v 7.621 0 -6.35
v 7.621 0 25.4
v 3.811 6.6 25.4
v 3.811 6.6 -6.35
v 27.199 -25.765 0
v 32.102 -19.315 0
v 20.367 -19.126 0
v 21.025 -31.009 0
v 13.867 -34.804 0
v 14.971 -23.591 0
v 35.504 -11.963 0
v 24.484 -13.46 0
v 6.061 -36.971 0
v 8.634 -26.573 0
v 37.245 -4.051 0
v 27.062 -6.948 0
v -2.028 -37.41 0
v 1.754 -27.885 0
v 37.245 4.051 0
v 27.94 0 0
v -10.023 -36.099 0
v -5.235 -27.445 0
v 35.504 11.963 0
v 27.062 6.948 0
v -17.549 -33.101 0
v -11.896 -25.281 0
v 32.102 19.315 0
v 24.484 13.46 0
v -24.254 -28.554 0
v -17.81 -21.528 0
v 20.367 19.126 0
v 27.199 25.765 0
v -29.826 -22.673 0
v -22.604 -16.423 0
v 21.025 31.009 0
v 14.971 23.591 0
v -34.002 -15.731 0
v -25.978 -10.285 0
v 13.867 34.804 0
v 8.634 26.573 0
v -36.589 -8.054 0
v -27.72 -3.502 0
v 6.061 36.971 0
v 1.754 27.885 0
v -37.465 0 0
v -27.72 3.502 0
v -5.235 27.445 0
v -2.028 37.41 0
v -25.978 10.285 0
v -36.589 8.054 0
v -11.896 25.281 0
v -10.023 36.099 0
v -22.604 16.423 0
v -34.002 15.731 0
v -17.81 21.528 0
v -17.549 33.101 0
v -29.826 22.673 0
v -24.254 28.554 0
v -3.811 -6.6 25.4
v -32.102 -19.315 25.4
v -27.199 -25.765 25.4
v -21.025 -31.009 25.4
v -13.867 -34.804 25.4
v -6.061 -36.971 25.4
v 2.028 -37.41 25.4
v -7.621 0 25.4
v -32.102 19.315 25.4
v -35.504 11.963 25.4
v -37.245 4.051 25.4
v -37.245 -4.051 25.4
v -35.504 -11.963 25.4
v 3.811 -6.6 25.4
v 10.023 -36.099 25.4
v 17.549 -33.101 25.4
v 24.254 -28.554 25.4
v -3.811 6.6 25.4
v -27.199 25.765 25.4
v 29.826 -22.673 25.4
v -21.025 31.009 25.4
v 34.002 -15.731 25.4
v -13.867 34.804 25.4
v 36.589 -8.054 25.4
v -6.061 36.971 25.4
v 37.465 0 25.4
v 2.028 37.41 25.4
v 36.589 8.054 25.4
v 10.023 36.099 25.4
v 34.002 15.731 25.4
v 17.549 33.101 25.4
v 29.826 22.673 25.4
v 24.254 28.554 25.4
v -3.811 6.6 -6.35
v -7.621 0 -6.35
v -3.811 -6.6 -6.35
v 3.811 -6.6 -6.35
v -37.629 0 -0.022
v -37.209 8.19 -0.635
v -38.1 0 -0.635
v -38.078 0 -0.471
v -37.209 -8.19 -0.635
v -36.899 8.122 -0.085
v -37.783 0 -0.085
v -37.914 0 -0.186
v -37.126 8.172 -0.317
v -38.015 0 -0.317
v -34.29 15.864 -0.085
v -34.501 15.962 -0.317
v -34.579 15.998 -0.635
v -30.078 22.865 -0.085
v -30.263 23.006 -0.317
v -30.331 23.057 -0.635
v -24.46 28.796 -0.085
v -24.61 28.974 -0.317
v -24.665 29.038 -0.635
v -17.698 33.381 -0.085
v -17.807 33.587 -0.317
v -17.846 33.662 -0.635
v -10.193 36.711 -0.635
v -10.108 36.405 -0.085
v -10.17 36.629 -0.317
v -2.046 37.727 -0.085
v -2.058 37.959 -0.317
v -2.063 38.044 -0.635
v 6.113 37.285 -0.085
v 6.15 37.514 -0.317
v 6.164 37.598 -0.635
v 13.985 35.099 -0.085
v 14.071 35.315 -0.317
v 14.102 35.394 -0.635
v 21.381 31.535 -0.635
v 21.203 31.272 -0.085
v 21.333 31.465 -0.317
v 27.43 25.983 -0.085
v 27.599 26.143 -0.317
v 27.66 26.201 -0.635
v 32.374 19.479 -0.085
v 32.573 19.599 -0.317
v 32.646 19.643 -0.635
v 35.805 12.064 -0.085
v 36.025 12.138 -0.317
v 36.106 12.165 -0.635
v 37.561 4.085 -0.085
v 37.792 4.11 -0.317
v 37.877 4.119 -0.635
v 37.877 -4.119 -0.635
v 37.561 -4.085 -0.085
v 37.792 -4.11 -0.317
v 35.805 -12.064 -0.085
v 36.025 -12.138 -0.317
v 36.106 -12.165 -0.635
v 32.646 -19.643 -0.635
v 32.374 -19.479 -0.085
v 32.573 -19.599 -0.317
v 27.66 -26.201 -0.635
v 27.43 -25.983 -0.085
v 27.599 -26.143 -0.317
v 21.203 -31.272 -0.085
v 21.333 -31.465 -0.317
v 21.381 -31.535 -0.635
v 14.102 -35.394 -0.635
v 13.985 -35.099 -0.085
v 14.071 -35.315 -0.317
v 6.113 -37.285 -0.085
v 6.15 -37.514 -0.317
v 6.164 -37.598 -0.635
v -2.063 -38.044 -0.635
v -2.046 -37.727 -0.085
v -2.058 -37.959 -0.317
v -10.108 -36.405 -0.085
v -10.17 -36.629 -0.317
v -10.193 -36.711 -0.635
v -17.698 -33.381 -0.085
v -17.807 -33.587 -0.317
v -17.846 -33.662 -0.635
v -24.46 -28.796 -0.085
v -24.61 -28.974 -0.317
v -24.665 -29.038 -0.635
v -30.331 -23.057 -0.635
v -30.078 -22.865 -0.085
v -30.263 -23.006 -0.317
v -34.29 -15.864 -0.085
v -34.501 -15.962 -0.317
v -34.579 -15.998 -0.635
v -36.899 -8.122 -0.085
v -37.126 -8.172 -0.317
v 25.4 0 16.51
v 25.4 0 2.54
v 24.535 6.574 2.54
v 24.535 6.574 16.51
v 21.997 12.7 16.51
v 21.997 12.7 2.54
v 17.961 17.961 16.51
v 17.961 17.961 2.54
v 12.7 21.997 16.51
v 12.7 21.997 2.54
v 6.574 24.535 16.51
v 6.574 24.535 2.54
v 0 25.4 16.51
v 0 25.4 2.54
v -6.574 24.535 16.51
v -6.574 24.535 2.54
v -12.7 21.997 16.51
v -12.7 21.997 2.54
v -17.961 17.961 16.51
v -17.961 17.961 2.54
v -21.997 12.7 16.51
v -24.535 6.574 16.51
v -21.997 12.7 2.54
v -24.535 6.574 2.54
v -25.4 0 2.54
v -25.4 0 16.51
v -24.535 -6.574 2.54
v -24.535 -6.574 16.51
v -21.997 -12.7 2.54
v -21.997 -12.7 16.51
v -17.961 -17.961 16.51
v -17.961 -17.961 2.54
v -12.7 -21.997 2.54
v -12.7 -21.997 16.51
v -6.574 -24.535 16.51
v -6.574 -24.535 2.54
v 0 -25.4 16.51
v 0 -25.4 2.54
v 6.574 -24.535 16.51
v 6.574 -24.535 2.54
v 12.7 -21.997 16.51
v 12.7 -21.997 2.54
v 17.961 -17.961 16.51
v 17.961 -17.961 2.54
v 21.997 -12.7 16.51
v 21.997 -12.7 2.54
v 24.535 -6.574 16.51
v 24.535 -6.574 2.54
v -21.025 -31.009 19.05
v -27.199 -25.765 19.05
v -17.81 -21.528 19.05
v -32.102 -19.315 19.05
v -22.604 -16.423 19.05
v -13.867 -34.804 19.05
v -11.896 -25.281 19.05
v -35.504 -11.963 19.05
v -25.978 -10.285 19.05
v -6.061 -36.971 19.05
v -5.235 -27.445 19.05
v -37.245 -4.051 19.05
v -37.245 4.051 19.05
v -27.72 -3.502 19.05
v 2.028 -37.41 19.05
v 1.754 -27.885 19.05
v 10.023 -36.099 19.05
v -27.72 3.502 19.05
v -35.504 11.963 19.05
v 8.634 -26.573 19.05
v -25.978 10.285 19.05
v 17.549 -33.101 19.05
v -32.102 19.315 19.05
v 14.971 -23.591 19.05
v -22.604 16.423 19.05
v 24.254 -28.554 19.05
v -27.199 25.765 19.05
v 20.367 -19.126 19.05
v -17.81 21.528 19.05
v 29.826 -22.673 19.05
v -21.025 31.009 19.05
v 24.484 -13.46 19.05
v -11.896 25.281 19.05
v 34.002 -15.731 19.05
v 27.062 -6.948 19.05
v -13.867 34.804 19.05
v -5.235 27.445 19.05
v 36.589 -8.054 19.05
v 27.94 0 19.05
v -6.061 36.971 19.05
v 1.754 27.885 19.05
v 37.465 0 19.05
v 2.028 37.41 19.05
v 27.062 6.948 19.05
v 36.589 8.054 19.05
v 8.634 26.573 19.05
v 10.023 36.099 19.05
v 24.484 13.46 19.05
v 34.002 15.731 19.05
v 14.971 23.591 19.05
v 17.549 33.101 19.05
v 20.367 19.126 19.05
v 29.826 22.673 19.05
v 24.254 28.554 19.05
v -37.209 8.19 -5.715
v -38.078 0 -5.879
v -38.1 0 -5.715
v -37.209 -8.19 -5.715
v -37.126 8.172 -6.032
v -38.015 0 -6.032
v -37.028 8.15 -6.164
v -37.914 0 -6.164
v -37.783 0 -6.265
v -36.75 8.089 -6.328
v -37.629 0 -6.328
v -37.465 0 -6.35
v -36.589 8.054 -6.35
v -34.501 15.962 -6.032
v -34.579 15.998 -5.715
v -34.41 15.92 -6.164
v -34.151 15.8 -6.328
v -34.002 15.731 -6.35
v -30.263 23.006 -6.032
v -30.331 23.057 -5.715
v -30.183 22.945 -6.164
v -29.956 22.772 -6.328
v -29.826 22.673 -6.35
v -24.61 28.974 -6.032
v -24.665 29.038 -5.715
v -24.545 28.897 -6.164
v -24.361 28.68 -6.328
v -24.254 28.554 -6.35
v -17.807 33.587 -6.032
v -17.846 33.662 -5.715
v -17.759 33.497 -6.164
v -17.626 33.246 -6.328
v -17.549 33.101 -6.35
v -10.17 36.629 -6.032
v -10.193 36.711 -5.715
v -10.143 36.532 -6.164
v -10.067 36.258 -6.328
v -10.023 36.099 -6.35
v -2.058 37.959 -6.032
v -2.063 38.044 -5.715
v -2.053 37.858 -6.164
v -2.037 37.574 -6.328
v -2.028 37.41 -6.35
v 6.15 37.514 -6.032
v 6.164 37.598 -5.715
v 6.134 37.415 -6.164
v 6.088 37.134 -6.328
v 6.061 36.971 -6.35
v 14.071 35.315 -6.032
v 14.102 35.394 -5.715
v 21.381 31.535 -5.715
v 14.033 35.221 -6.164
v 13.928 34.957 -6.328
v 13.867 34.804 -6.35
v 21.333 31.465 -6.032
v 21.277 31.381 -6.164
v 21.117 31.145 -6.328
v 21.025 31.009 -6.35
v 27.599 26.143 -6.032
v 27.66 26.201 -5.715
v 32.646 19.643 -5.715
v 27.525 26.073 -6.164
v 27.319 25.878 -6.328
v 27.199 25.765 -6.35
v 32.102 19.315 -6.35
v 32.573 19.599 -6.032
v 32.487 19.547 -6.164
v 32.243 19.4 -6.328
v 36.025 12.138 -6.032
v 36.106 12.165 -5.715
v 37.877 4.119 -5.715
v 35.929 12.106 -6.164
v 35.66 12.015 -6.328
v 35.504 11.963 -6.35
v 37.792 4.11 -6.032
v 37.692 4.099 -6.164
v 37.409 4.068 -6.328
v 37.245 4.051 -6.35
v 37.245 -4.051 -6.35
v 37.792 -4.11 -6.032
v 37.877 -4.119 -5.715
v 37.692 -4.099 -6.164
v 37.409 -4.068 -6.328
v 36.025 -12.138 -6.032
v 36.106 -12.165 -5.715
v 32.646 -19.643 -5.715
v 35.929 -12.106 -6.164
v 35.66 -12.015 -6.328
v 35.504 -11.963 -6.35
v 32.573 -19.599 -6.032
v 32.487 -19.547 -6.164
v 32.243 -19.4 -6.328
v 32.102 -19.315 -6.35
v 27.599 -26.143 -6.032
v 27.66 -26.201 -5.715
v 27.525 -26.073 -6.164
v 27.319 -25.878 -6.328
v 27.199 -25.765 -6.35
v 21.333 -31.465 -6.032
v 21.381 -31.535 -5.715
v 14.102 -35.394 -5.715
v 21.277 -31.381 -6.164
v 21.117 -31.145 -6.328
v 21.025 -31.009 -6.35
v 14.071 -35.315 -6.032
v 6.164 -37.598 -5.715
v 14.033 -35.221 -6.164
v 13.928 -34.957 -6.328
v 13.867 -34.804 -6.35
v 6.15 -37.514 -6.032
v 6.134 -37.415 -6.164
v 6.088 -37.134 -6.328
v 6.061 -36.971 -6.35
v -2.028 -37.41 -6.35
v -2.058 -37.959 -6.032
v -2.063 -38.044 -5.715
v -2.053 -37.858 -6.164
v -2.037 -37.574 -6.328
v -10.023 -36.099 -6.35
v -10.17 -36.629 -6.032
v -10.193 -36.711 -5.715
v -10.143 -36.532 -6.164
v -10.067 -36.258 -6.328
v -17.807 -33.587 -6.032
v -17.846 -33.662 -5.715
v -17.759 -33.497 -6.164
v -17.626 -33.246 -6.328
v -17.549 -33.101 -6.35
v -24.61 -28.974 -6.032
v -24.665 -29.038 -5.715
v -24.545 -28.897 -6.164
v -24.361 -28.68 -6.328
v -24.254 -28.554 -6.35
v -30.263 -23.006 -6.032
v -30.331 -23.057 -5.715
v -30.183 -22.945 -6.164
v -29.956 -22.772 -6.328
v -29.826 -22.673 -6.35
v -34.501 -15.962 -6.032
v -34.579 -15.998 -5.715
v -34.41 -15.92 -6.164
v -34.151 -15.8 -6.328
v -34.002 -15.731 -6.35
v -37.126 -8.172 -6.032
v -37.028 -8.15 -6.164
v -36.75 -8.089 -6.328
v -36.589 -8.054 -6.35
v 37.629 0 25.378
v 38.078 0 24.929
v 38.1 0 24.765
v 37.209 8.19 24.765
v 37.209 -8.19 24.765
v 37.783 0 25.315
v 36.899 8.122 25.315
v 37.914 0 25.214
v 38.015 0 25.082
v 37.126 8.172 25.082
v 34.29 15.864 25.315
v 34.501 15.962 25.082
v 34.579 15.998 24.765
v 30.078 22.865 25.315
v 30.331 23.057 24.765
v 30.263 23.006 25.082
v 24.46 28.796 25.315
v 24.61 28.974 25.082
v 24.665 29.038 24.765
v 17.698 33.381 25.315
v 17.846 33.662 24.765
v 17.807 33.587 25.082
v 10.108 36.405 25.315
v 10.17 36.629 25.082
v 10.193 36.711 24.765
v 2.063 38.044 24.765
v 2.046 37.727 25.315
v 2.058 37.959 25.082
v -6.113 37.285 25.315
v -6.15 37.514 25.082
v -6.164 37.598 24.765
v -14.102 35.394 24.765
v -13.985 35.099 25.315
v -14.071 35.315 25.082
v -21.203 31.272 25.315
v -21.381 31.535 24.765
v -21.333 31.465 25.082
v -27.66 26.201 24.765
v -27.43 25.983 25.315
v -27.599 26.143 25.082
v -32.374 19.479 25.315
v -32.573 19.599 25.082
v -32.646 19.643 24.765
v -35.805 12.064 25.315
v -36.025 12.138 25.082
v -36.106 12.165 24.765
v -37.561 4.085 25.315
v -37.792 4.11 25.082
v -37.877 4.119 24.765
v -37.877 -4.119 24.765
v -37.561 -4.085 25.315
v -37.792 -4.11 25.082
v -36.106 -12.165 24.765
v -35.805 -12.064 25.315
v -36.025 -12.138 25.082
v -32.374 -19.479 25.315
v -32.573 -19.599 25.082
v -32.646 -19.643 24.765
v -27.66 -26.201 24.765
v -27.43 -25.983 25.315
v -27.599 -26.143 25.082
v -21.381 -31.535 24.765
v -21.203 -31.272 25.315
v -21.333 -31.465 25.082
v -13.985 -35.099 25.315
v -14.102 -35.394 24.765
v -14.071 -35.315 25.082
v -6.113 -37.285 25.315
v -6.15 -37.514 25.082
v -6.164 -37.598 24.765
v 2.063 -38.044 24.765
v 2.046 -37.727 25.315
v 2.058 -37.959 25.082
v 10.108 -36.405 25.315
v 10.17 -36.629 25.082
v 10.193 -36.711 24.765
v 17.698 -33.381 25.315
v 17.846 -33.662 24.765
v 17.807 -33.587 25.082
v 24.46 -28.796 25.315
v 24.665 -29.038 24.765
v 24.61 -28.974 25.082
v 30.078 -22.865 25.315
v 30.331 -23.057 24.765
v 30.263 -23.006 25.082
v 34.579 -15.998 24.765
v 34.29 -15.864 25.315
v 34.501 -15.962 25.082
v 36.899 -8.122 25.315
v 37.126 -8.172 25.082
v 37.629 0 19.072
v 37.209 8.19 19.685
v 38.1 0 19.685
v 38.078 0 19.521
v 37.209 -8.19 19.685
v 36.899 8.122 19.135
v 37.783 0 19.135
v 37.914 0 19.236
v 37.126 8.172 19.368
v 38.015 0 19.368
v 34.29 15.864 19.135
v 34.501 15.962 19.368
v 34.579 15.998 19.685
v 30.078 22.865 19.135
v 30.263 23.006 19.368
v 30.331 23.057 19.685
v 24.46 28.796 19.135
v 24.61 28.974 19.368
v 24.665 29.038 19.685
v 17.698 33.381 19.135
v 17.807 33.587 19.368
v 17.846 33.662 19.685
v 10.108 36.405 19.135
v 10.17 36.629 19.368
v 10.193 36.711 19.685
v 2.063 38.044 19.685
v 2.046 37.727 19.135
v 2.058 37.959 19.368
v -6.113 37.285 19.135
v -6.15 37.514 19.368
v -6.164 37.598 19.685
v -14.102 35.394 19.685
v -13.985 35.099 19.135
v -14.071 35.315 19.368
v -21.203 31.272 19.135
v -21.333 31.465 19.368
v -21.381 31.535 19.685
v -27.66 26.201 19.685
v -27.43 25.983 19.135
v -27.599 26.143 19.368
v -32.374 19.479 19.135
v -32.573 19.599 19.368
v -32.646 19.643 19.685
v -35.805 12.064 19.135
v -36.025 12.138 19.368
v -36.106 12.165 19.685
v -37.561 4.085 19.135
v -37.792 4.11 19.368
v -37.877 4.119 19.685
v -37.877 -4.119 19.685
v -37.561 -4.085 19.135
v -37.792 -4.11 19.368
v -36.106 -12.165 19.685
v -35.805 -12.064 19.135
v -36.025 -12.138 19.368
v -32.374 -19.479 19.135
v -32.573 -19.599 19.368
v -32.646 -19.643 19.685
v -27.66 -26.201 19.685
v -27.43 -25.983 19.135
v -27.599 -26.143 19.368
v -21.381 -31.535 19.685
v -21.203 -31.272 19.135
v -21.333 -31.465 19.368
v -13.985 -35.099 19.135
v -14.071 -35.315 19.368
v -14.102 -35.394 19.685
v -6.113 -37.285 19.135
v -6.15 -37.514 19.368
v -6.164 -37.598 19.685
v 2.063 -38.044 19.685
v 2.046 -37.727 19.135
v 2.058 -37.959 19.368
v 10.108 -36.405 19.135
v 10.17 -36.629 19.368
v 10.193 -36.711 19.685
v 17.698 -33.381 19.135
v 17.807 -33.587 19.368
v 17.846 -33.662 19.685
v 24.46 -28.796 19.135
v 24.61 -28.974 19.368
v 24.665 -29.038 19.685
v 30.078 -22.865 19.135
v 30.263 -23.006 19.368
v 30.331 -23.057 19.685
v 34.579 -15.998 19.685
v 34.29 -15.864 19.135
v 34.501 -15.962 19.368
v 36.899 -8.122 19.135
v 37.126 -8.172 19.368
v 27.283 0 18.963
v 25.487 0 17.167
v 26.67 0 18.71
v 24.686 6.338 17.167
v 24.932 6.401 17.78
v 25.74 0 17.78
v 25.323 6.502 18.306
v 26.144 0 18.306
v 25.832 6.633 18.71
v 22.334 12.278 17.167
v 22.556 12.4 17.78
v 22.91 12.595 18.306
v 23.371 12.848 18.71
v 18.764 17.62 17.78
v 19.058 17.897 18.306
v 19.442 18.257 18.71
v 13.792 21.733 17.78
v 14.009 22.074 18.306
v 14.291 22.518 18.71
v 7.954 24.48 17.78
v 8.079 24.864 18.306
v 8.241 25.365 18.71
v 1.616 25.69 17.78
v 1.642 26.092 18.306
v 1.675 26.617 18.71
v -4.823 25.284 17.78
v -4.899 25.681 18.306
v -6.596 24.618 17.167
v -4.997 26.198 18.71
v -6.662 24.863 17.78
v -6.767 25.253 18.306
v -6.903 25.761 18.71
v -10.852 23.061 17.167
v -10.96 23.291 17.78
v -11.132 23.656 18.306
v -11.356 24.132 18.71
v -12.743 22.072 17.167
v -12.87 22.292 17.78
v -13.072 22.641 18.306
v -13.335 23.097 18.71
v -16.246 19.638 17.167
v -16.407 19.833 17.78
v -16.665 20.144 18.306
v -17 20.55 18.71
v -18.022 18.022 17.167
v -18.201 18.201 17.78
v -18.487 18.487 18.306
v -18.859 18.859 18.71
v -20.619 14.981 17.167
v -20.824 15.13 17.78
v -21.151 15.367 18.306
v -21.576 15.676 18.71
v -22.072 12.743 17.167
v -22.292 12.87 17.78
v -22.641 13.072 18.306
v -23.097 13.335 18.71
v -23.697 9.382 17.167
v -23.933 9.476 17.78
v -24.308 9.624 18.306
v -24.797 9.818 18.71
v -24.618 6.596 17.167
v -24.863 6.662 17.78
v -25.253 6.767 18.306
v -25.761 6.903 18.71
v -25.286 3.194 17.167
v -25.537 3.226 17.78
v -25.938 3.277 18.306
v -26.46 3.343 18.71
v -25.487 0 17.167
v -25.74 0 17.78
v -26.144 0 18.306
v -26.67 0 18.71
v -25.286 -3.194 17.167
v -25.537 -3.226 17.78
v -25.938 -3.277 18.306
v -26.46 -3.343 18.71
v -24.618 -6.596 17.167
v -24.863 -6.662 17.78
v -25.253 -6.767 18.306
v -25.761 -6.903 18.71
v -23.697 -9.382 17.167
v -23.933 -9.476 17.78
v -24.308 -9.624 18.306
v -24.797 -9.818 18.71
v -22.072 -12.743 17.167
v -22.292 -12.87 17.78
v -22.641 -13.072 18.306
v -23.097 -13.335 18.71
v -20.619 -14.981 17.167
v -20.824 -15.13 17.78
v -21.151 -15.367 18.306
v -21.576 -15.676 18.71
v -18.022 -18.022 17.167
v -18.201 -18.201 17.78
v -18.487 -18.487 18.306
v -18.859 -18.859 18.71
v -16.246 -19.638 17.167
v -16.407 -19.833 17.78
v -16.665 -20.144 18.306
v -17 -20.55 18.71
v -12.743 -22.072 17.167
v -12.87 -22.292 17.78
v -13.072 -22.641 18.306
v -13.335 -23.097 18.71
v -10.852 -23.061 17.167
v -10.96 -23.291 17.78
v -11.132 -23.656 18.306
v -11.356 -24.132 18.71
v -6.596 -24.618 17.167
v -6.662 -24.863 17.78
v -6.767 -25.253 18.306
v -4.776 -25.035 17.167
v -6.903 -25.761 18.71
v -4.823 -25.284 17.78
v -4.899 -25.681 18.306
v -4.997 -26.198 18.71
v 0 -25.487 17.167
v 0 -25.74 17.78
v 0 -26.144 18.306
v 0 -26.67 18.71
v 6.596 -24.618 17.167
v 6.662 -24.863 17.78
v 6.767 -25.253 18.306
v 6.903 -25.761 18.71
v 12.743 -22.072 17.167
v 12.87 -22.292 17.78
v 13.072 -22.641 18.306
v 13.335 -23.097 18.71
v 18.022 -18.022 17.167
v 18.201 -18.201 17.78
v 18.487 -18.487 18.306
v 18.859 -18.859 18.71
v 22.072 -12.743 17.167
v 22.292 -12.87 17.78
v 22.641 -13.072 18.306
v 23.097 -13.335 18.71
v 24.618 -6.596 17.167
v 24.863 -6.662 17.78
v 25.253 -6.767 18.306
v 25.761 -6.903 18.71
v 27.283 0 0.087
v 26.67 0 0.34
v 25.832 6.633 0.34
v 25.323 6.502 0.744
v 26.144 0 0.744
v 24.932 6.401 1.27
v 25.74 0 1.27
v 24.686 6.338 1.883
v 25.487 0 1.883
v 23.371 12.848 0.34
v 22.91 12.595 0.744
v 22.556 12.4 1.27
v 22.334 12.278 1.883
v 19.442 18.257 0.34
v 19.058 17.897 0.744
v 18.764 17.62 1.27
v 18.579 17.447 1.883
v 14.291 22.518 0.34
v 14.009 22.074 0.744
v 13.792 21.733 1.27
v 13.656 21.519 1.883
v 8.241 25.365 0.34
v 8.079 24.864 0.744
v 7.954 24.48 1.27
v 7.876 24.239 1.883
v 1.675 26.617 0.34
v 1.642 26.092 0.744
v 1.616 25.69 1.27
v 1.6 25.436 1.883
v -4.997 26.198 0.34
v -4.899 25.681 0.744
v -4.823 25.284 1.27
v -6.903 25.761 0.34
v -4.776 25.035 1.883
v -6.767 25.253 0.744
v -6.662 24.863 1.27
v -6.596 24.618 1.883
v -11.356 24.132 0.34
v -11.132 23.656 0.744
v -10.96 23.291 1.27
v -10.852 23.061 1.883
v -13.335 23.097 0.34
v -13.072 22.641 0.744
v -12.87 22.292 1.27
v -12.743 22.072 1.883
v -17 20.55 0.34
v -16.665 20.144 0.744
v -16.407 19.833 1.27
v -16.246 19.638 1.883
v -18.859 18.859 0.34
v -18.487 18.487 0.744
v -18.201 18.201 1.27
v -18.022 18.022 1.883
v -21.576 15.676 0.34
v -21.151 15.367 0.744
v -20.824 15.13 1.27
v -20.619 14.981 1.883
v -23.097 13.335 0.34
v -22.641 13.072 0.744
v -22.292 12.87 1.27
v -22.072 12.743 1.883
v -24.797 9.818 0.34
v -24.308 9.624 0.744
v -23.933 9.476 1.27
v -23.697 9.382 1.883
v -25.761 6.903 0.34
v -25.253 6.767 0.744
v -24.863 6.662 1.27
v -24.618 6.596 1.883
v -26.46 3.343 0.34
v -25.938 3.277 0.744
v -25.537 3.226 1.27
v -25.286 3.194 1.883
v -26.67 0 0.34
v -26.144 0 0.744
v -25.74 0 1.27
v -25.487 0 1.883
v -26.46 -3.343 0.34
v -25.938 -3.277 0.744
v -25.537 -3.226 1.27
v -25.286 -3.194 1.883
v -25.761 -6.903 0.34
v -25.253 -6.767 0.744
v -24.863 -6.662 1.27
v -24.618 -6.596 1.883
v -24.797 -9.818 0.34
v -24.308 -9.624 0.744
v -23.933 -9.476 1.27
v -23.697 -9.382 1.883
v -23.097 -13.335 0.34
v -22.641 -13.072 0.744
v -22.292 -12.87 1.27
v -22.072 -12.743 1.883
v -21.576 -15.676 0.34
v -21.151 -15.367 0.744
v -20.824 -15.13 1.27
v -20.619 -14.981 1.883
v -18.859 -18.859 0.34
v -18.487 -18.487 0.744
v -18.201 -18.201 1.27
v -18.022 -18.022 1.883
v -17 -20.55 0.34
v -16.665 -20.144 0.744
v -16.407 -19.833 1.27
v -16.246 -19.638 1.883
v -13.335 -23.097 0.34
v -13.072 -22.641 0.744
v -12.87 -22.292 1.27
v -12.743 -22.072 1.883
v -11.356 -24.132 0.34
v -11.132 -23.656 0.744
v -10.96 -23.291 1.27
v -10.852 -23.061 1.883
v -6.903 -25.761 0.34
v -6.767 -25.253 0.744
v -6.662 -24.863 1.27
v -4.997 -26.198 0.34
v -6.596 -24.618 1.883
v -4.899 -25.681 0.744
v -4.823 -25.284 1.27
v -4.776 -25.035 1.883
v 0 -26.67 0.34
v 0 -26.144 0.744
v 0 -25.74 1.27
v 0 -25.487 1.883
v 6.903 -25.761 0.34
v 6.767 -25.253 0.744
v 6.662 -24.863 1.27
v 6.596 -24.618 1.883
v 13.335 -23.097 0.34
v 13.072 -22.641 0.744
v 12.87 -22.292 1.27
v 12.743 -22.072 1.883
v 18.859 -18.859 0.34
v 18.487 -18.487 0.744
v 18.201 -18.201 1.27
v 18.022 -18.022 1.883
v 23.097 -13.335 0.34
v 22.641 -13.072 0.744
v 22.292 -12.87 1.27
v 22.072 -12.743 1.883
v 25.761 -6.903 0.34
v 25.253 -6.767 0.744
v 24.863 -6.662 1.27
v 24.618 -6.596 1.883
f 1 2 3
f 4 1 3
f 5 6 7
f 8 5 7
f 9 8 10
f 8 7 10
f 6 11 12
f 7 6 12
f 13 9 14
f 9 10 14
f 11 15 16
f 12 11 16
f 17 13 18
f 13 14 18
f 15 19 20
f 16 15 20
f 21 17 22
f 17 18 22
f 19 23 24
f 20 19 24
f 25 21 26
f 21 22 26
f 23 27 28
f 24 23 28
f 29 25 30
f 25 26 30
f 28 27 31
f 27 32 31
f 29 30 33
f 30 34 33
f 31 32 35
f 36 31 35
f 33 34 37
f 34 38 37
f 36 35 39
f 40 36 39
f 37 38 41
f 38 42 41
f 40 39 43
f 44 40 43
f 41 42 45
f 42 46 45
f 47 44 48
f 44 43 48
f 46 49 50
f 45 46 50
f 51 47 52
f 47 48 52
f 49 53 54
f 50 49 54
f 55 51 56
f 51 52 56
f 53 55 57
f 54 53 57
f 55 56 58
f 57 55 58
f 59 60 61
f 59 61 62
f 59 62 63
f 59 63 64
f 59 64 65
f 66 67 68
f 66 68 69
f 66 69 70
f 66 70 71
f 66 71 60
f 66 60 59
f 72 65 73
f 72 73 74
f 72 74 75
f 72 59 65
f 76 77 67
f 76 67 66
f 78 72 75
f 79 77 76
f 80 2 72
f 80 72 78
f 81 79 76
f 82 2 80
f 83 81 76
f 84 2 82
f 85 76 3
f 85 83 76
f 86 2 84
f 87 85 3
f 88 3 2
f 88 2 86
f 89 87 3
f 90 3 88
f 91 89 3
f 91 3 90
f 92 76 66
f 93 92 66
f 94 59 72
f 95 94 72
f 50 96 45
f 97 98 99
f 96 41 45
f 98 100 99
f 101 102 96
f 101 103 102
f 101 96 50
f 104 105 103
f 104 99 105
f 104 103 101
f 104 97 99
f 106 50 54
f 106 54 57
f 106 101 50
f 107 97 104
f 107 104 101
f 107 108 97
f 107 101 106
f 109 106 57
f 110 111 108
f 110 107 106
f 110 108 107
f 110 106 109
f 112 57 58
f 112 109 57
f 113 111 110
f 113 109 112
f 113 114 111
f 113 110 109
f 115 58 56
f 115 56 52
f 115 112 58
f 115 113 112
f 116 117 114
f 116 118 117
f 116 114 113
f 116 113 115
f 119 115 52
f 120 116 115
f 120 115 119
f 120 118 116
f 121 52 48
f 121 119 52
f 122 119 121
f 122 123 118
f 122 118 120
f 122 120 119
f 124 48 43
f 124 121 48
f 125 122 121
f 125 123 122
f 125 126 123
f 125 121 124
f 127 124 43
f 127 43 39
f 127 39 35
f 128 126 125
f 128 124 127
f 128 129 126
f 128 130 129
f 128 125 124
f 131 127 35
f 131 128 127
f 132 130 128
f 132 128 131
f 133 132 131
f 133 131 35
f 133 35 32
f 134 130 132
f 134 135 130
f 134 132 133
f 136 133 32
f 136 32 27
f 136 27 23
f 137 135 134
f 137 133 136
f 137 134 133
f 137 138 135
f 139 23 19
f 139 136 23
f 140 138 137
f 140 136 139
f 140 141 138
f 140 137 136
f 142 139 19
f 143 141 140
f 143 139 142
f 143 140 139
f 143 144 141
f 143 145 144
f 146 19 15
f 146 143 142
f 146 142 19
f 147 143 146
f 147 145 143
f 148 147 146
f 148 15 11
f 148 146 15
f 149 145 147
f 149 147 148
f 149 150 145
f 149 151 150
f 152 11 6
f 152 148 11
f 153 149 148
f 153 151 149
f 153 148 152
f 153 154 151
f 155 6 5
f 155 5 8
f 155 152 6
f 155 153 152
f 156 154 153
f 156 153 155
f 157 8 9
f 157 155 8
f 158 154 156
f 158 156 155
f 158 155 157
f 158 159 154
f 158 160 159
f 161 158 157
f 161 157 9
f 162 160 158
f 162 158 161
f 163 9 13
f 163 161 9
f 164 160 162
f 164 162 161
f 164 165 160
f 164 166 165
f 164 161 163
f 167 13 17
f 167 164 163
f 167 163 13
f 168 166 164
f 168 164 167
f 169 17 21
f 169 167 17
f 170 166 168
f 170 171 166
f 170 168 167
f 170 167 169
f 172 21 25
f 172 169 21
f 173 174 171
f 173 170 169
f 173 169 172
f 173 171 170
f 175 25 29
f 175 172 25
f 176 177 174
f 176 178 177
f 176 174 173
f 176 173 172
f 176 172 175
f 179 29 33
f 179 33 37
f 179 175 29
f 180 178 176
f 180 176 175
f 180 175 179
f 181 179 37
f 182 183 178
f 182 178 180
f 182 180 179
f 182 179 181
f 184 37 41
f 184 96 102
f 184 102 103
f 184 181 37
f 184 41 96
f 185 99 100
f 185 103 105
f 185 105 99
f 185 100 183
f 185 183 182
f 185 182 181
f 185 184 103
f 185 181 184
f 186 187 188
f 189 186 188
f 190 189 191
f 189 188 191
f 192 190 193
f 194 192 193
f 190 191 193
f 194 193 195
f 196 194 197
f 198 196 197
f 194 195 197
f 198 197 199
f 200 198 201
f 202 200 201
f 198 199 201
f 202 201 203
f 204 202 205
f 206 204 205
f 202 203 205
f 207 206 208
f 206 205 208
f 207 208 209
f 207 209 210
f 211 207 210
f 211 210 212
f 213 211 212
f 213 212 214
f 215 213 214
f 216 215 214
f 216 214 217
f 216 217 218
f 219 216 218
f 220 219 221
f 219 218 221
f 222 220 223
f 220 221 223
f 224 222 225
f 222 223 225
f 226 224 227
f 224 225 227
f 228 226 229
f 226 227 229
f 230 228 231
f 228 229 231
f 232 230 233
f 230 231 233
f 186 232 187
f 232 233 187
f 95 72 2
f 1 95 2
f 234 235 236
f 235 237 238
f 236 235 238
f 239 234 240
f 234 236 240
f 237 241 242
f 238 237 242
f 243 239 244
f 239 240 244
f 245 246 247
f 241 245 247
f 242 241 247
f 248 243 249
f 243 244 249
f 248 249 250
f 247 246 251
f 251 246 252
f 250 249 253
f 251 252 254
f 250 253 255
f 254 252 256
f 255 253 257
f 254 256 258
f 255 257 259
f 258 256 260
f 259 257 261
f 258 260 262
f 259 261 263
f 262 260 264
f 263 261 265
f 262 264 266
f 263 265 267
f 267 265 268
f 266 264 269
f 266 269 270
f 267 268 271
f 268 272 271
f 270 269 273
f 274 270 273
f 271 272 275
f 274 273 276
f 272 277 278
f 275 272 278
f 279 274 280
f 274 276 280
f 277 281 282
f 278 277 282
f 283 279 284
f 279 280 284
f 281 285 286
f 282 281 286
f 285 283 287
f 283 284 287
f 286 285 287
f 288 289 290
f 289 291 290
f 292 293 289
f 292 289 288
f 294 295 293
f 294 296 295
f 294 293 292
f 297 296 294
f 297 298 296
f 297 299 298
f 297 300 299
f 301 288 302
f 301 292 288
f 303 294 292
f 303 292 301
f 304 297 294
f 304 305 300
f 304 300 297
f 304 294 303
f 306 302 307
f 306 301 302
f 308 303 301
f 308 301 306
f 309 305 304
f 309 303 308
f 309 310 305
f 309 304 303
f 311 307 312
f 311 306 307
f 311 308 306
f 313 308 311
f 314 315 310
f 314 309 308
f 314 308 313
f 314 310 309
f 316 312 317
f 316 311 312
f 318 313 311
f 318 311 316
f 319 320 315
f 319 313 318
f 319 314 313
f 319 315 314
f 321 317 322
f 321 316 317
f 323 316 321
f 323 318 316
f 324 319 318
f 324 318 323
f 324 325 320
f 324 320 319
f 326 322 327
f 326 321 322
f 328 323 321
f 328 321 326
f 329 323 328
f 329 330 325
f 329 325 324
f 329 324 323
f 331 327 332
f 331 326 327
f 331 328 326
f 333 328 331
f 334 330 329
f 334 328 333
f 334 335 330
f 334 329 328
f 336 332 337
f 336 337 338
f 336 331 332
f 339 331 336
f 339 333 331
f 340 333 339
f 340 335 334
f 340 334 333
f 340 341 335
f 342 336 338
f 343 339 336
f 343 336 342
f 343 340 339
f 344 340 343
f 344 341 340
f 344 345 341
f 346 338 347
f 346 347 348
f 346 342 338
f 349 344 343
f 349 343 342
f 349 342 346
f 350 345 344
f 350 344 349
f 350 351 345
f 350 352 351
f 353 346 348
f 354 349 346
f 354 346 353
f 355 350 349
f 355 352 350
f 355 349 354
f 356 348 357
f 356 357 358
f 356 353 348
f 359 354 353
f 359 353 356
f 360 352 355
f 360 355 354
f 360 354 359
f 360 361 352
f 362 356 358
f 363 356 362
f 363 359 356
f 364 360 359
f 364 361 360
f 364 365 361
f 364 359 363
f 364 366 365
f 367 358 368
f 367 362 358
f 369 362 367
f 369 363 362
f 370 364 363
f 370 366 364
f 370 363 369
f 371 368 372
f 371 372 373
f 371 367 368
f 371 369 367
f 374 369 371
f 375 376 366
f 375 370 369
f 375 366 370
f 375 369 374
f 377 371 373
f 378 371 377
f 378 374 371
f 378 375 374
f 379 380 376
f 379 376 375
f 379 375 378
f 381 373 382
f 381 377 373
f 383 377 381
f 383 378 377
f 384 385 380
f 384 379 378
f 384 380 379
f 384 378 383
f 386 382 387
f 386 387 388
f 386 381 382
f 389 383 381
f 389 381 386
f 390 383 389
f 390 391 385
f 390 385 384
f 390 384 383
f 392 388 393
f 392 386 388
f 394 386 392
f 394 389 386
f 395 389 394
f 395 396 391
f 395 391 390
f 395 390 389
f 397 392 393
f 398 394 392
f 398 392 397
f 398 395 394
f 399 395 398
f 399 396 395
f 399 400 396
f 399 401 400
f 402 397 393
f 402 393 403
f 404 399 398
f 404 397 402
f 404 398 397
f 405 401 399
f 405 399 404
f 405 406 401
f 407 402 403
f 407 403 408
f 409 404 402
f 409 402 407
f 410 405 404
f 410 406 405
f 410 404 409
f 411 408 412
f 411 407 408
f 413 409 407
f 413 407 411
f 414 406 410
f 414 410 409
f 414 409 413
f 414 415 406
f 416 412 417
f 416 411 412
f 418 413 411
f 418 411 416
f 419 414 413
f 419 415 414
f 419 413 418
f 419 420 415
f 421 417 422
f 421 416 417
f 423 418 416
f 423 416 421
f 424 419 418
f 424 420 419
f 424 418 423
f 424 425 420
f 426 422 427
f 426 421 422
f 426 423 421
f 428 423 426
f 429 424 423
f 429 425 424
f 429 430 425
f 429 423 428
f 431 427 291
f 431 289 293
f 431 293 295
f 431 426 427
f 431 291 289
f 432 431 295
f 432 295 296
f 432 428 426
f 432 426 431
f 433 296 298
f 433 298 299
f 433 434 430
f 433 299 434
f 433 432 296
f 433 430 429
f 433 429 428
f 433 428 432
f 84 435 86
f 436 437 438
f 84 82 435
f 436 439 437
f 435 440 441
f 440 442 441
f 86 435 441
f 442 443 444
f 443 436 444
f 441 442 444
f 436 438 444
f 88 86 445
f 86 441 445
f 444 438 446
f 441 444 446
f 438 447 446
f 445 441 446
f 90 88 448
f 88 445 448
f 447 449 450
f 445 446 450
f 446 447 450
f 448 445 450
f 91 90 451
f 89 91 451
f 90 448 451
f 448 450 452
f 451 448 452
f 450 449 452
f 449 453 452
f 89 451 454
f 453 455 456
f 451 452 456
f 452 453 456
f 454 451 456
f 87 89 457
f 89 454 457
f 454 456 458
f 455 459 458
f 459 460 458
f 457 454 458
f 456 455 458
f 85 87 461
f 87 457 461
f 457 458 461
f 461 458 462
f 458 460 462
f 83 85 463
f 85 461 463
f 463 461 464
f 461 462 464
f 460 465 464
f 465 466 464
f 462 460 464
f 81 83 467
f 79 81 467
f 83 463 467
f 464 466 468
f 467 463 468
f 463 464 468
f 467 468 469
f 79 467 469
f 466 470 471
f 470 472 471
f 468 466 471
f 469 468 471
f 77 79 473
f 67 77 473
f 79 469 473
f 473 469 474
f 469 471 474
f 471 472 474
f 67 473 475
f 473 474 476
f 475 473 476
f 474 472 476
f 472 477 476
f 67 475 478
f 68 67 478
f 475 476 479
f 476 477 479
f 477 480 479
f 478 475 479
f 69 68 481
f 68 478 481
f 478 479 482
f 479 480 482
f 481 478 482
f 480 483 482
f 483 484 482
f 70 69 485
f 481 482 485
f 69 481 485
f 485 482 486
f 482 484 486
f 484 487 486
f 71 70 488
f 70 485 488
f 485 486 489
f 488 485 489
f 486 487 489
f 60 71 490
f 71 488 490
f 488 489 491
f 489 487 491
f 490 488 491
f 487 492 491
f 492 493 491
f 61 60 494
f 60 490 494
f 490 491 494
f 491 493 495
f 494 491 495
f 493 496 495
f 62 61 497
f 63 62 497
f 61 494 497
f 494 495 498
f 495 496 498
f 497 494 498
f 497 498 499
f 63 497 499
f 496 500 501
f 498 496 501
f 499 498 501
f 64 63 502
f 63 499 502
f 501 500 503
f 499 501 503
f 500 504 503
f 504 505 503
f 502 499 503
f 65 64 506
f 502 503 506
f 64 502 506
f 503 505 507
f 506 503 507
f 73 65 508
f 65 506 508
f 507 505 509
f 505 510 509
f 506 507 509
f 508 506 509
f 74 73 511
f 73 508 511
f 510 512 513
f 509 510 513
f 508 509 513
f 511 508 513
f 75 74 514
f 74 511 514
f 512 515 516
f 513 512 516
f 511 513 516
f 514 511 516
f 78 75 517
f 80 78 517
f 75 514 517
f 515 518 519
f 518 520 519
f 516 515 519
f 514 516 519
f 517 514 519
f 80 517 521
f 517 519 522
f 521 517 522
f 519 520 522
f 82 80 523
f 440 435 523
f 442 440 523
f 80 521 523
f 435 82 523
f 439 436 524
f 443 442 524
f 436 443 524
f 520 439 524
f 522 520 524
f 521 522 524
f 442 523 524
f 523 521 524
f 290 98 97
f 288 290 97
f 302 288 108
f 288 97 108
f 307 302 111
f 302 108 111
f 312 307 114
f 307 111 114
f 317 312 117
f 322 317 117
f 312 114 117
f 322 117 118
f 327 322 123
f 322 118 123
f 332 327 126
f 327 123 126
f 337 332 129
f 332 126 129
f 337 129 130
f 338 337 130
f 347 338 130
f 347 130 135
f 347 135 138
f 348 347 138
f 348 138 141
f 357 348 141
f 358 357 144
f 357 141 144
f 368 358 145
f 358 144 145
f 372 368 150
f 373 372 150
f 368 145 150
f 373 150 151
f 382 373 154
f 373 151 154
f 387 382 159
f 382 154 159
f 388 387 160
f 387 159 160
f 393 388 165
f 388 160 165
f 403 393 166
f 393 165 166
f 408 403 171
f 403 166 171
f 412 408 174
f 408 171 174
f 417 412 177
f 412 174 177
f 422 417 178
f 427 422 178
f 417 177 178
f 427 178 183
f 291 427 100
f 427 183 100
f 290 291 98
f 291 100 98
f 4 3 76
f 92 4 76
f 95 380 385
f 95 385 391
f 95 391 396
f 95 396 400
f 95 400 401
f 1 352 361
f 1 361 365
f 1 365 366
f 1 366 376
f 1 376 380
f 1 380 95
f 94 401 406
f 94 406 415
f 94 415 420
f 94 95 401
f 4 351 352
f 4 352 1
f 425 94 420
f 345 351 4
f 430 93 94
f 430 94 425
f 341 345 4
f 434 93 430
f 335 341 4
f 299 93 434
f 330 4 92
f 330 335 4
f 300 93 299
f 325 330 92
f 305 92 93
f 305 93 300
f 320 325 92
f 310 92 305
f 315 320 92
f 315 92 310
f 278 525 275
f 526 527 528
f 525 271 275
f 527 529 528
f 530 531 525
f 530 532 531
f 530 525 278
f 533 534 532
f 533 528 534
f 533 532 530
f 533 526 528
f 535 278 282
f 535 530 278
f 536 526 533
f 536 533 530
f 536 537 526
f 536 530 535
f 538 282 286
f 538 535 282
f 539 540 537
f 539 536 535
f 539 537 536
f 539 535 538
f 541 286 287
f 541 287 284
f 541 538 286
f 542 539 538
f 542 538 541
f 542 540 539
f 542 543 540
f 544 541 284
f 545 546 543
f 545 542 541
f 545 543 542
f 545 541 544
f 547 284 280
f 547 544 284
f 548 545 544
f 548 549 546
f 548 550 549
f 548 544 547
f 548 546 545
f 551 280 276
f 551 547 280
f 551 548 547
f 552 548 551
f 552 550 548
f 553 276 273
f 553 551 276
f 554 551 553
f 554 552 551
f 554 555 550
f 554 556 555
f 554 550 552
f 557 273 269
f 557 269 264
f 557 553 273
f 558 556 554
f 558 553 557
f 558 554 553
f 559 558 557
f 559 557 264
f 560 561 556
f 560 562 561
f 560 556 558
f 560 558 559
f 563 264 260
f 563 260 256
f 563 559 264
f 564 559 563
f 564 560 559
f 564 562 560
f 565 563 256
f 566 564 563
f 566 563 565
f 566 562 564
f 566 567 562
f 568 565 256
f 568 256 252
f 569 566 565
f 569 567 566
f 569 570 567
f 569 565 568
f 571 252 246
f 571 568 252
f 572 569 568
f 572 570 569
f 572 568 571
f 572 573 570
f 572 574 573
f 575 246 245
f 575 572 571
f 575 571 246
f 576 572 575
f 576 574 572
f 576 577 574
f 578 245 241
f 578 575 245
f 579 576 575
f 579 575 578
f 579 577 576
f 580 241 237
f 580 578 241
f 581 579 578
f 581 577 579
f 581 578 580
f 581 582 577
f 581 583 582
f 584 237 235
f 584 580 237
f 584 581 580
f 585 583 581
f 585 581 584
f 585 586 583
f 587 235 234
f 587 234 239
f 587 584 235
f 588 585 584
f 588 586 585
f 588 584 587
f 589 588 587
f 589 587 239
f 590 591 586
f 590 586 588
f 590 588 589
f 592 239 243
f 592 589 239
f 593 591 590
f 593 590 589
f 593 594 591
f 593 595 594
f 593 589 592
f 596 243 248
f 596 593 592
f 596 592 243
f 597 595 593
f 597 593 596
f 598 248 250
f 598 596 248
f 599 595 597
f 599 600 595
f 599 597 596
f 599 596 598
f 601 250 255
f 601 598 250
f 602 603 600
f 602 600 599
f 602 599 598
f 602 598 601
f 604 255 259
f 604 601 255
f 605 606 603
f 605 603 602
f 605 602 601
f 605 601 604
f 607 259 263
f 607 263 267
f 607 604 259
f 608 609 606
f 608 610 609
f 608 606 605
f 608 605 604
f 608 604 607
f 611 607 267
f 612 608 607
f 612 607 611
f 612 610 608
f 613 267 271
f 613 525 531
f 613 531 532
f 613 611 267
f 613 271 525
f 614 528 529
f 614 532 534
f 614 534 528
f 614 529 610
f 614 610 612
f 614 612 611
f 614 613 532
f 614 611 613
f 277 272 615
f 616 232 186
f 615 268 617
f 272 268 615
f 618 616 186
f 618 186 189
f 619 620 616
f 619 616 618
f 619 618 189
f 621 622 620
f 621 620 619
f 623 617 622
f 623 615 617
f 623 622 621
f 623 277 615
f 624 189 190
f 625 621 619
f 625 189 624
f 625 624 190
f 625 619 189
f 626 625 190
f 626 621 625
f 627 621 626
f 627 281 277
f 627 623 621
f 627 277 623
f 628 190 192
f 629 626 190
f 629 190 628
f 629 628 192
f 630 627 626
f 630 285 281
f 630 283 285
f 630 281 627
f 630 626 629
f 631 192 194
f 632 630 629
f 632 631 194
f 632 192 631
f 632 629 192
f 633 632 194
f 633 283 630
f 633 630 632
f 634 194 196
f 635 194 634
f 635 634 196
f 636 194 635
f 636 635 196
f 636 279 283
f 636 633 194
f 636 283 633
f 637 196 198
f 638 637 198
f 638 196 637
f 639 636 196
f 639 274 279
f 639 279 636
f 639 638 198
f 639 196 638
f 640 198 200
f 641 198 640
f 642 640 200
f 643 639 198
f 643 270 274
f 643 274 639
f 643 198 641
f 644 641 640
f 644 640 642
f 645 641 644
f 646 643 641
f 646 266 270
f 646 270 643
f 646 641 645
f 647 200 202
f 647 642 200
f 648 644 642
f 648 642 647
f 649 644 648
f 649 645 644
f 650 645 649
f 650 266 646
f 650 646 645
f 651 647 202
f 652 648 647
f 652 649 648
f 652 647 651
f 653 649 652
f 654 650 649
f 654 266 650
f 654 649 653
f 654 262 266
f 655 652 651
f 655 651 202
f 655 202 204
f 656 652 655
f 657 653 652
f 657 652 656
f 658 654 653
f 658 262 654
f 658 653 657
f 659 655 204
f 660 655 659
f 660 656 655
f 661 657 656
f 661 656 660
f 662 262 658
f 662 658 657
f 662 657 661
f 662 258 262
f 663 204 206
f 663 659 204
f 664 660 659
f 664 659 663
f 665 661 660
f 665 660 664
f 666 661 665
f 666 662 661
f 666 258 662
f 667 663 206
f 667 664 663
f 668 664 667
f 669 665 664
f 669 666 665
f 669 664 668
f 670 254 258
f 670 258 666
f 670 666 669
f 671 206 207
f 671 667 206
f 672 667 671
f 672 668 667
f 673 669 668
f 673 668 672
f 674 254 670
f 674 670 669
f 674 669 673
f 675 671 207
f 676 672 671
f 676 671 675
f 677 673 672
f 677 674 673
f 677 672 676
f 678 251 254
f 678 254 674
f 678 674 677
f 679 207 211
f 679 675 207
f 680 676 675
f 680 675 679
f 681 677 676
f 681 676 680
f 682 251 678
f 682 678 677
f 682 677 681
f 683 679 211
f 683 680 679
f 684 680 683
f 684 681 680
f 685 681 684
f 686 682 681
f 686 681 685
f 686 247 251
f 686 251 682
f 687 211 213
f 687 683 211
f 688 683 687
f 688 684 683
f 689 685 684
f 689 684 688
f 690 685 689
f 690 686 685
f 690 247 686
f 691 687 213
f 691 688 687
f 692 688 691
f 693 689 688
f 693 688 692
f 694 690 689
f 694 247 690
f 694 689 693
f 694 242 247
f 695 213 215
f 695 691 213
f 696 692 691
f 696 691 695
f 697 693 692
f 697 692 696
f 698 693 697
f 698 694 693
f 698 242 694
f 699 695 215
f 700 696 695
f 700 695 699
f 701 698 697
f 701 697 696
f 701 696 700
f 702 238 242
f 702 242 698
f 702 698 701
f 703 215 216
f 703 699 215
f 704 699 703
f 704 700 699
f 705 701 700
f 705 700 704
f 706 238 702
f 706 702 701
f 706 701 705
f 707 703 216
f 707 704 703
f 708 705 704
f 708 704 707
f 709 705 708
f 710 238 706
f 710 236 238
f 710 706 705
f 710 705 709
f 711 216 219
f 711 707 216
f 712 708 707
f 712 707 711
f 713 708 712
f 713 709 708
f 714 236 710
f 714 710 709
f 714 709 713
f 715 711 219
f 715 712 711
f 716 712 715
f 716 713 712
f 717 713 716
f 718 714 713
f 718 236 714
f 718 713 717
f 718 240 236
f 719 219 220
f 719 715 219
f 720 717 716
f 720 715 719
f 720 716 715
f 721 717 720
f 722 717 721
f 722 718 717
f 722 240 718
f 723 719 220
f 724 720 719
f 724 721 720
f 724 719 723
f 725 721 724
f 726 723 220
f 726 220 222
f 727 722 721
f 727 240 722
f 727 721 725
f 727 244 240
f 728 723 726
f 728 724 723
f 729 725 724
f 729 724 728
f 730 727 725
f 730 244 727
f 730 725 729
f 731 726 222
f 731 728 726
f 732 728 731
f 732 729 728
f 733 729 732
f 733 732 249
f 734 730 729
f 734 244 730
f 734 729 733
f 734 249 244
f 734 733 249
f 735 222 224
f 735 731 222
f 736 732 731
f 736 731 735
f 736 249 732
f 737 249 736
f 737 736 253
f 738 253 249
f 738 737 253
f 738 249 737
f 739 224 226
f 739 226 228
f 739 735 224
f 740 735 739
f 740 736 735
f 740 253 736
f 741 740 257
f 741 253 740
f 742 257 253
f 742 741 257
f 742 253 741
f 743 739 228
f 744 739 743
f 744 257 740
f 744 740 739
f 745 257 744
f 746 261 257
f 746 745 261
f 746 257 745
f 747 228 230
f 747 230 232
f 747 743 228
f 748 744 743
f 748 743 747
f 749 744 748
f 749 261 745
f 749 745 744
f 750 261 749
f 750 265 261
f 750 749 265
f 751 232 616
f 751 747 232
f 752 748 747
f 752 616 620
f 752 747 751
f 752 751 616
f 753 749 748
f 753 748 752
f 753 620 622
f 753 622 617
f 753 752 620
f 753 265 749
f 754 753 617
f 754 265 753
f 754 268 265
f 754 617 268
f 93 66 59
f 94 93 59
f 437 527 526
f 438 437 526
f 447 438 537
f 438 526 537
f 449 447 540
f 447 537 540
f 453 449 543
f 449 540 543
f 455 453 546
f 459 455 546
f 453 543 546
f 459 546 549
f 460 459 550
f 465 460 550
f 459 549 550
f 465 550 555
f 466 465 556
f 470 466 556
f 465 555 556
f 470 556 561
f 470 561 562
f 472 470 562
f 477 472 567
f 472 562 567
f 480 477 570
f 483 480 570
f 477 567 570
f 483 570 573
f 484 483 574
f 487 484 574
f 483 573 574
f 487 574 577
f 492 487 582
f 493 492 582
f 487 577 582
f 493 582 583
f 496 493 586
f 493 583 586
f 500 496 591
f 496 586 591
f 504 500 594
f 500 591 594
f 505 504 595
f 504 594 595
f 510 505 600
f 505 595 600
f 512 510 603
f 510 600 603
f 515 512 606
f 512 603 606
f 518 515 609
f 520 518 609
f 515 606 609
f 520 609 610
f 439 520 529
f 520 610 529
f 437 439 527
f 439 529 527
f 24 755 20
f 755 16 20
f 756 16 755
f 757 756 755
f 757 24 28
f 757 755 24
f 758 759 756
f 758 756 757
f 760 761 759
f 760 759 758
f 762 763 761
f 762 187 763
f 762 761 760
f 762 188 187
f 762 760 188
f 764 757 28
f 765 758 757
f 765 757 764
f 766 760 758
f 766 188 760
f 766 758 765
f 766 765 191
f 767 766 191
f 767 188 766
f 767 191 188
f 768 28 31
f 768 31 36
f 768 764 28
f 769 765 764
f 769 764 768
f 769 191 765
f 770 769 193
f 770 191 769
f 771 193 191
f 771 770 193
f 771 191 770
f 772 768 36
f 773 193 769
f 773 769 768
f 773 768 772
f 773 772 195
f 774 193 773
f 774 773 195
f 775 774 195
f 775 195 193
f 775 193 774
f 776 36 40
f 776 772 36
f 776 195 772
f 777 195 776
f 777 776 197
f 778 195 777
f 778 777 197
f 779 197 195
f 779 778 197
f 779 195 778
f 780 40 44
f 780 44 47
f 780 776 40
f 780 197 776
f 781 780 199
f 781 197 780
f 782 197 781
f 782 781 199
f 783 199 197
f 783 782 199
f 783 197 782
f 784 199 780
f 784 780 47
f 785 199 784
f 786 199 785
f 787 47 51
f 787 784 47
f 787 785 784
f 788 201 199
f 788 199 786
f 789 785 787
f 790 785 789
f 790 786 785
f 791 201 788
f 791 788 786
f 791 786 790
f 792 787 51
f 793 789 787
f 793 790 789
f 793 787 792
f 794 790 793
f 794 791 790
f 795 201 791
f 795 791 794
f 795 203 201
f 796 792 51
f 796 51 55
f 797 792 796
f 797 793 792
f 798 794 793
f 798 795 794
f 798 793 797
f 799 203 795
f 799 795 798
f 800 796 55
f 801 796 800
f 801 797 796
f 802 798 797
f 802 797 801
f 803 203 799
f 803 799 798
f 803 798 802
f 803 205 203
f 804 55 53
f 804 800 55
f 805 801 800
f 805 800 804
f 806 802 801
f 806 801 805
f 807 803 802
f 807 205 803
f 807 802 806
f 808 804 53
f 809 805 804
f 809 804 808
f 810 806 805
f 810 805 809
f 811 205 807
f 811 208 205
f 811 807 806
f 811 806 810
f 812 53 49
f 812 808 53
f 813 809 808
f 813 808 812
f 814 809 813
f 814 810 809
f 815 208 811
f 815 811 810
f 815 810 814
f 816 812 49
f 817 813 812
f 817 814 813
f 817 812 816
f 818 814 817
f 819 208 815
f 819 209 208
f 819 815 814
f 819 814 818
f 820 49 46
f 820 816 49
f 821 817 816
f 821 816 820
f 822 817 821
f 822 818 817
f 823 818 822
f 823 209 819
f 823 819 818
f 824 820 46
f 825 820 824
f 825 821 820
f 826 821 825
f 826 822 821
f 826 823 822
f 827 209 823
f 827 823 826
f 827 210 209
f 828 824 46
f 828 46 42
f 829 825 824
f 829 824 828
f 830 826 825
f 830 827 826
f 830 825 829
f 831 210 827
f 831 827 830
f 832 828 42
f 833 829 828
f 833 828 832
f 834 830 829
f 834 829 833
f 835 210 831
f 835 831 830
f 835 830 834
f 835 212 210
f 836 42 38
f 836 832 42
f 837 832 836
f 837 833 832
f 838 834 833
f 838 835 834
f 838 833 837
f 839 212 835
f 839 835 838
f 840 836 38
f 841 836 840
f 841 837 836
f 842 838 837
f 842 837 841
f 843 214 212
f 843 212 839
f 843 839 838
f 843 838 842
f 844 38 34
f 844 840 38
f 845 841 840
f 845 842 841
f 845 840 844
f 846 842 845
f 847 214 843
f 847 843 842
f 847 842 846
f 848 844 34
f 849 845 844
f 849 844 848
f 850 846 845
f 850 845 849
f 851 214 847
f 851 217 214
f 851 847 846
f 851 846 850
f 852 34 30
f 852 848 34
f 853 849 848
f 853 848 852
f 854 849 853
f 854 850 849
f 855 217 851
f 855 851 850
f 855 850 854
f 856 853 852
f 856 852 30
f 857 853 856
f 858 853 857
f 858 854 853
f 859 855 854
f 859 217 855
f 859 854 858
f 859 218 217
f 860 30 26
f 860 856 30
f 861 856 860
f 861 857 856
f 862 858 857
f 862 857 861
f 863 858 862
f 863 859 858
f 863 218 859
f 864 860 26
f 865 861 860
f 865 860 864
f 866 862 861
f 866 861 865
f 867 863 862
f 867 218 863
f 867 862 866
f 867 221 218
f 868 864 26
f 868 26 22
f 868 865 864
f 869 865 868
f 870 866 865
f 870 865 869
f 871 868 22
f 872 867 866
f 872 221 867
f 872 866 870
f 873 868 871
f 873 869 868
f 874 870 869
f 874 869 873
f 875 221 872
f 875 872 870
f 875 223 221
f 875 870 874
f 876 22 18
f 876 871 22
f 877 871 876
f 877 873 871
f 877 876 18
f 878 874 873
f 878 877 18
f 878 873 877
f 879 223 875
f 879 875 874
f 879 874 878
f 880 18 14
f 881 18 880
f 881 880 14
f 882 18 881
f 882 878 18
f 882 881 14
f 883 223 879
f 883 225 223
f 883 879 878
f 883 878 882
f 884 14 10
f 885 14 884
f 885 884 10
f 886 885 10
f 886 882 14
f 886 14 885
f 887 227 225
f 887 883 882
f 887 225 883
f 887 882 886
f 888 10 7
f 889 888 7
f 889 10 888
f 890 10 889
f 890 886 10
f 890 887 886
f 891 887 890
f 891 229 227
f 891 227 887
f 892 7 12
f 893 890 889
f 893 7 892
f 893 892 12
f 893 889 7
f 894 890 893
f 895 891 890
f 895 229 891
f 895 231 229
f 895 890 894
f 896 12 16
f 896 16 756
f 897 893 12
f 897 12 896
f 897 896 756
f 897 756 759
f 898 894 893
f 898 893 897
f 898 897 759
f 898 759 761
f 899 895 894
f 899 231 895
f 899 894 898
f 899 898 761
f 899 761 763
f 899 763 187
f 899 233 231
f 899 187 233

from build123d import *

# Parameters (mm, degrees)
SKETCH1_R           = 25.4
BOSS_EXTRUDE1_DEPTH = 19.05
SKETCH2_R           = 38.1
BOSS_EXTRUDE2_DEPTH = 6.35
SKETCH3_R           = 38.1
BOSS_EXTRUDE3_DEPTH = 6.35
CUT_EXTRUDE1_DEPTH  = 32.75
FILLET1_R           = 2.54
FILLET2_R           = 0.635


with BuildPart() as part:
    # Sketch1 → Boss-Extrude1 (new body)
    with BuildSketch(Plane.XY):
        Circle(SKETCH1_R)
    extrude(amount=BOSS_EXTRUDE1_DEPTH)

    # Sketch2 → Boss-Extrude2 (add)
    with BuildSketch(Plane.XY.offset(19.05)):
        Circle(SKETCH2_R)
    extrude(amount=BOSS_EXTRUDE2_DEPTH)

    # Sketch3 → Boss-Extrude3 (add)
    with BuildSketch(Plane(origin=(0, 0, 0), x_dir=(-1, 0, 0), z_dir=(0, 0, -1))):
        Circle(SKETCH3_R)
    extrude(amount=BOSS_EXTRUDE3_DEPTH)

    # Sketch4 → Cut-Extrude1 (cut, through all)
    with BuildSketch(Plane.XY.offset(25.4)):
        Polygon((7.621023553, 0), (3.810511777, 6.6), (-3.810511777, 6.6), (-7.621023553, 0), (-3.810511777, -6.6), (3.810511777, -6.6), align=None)
    extrude(amount=-CUT_EXTRUDE1_DEPTH, mode=Mode.SUBTRACT)

    # Fillet1
    fillet1_edges = [part.edges().sort_by_distance(p)[0] for p in [
        (-25.4, 0, 19.05),
        (-25.4, 0, 0),
    ]]
    fillet(fillet1_edges, radius=FILLET1_R)

    # Fillet2
    fillet2_edges = [part.edges().sort_by_distance(p)[0] for p in [
        (38.1, 0, -6.35),
        (-38.1, 0, 19.05),
        (-38.1, 0, 25.4),
        (38.1, 0, 0),
    ]]
    fillet(fillet2_edges, radius=FILLET2_R)


solid = part.part
